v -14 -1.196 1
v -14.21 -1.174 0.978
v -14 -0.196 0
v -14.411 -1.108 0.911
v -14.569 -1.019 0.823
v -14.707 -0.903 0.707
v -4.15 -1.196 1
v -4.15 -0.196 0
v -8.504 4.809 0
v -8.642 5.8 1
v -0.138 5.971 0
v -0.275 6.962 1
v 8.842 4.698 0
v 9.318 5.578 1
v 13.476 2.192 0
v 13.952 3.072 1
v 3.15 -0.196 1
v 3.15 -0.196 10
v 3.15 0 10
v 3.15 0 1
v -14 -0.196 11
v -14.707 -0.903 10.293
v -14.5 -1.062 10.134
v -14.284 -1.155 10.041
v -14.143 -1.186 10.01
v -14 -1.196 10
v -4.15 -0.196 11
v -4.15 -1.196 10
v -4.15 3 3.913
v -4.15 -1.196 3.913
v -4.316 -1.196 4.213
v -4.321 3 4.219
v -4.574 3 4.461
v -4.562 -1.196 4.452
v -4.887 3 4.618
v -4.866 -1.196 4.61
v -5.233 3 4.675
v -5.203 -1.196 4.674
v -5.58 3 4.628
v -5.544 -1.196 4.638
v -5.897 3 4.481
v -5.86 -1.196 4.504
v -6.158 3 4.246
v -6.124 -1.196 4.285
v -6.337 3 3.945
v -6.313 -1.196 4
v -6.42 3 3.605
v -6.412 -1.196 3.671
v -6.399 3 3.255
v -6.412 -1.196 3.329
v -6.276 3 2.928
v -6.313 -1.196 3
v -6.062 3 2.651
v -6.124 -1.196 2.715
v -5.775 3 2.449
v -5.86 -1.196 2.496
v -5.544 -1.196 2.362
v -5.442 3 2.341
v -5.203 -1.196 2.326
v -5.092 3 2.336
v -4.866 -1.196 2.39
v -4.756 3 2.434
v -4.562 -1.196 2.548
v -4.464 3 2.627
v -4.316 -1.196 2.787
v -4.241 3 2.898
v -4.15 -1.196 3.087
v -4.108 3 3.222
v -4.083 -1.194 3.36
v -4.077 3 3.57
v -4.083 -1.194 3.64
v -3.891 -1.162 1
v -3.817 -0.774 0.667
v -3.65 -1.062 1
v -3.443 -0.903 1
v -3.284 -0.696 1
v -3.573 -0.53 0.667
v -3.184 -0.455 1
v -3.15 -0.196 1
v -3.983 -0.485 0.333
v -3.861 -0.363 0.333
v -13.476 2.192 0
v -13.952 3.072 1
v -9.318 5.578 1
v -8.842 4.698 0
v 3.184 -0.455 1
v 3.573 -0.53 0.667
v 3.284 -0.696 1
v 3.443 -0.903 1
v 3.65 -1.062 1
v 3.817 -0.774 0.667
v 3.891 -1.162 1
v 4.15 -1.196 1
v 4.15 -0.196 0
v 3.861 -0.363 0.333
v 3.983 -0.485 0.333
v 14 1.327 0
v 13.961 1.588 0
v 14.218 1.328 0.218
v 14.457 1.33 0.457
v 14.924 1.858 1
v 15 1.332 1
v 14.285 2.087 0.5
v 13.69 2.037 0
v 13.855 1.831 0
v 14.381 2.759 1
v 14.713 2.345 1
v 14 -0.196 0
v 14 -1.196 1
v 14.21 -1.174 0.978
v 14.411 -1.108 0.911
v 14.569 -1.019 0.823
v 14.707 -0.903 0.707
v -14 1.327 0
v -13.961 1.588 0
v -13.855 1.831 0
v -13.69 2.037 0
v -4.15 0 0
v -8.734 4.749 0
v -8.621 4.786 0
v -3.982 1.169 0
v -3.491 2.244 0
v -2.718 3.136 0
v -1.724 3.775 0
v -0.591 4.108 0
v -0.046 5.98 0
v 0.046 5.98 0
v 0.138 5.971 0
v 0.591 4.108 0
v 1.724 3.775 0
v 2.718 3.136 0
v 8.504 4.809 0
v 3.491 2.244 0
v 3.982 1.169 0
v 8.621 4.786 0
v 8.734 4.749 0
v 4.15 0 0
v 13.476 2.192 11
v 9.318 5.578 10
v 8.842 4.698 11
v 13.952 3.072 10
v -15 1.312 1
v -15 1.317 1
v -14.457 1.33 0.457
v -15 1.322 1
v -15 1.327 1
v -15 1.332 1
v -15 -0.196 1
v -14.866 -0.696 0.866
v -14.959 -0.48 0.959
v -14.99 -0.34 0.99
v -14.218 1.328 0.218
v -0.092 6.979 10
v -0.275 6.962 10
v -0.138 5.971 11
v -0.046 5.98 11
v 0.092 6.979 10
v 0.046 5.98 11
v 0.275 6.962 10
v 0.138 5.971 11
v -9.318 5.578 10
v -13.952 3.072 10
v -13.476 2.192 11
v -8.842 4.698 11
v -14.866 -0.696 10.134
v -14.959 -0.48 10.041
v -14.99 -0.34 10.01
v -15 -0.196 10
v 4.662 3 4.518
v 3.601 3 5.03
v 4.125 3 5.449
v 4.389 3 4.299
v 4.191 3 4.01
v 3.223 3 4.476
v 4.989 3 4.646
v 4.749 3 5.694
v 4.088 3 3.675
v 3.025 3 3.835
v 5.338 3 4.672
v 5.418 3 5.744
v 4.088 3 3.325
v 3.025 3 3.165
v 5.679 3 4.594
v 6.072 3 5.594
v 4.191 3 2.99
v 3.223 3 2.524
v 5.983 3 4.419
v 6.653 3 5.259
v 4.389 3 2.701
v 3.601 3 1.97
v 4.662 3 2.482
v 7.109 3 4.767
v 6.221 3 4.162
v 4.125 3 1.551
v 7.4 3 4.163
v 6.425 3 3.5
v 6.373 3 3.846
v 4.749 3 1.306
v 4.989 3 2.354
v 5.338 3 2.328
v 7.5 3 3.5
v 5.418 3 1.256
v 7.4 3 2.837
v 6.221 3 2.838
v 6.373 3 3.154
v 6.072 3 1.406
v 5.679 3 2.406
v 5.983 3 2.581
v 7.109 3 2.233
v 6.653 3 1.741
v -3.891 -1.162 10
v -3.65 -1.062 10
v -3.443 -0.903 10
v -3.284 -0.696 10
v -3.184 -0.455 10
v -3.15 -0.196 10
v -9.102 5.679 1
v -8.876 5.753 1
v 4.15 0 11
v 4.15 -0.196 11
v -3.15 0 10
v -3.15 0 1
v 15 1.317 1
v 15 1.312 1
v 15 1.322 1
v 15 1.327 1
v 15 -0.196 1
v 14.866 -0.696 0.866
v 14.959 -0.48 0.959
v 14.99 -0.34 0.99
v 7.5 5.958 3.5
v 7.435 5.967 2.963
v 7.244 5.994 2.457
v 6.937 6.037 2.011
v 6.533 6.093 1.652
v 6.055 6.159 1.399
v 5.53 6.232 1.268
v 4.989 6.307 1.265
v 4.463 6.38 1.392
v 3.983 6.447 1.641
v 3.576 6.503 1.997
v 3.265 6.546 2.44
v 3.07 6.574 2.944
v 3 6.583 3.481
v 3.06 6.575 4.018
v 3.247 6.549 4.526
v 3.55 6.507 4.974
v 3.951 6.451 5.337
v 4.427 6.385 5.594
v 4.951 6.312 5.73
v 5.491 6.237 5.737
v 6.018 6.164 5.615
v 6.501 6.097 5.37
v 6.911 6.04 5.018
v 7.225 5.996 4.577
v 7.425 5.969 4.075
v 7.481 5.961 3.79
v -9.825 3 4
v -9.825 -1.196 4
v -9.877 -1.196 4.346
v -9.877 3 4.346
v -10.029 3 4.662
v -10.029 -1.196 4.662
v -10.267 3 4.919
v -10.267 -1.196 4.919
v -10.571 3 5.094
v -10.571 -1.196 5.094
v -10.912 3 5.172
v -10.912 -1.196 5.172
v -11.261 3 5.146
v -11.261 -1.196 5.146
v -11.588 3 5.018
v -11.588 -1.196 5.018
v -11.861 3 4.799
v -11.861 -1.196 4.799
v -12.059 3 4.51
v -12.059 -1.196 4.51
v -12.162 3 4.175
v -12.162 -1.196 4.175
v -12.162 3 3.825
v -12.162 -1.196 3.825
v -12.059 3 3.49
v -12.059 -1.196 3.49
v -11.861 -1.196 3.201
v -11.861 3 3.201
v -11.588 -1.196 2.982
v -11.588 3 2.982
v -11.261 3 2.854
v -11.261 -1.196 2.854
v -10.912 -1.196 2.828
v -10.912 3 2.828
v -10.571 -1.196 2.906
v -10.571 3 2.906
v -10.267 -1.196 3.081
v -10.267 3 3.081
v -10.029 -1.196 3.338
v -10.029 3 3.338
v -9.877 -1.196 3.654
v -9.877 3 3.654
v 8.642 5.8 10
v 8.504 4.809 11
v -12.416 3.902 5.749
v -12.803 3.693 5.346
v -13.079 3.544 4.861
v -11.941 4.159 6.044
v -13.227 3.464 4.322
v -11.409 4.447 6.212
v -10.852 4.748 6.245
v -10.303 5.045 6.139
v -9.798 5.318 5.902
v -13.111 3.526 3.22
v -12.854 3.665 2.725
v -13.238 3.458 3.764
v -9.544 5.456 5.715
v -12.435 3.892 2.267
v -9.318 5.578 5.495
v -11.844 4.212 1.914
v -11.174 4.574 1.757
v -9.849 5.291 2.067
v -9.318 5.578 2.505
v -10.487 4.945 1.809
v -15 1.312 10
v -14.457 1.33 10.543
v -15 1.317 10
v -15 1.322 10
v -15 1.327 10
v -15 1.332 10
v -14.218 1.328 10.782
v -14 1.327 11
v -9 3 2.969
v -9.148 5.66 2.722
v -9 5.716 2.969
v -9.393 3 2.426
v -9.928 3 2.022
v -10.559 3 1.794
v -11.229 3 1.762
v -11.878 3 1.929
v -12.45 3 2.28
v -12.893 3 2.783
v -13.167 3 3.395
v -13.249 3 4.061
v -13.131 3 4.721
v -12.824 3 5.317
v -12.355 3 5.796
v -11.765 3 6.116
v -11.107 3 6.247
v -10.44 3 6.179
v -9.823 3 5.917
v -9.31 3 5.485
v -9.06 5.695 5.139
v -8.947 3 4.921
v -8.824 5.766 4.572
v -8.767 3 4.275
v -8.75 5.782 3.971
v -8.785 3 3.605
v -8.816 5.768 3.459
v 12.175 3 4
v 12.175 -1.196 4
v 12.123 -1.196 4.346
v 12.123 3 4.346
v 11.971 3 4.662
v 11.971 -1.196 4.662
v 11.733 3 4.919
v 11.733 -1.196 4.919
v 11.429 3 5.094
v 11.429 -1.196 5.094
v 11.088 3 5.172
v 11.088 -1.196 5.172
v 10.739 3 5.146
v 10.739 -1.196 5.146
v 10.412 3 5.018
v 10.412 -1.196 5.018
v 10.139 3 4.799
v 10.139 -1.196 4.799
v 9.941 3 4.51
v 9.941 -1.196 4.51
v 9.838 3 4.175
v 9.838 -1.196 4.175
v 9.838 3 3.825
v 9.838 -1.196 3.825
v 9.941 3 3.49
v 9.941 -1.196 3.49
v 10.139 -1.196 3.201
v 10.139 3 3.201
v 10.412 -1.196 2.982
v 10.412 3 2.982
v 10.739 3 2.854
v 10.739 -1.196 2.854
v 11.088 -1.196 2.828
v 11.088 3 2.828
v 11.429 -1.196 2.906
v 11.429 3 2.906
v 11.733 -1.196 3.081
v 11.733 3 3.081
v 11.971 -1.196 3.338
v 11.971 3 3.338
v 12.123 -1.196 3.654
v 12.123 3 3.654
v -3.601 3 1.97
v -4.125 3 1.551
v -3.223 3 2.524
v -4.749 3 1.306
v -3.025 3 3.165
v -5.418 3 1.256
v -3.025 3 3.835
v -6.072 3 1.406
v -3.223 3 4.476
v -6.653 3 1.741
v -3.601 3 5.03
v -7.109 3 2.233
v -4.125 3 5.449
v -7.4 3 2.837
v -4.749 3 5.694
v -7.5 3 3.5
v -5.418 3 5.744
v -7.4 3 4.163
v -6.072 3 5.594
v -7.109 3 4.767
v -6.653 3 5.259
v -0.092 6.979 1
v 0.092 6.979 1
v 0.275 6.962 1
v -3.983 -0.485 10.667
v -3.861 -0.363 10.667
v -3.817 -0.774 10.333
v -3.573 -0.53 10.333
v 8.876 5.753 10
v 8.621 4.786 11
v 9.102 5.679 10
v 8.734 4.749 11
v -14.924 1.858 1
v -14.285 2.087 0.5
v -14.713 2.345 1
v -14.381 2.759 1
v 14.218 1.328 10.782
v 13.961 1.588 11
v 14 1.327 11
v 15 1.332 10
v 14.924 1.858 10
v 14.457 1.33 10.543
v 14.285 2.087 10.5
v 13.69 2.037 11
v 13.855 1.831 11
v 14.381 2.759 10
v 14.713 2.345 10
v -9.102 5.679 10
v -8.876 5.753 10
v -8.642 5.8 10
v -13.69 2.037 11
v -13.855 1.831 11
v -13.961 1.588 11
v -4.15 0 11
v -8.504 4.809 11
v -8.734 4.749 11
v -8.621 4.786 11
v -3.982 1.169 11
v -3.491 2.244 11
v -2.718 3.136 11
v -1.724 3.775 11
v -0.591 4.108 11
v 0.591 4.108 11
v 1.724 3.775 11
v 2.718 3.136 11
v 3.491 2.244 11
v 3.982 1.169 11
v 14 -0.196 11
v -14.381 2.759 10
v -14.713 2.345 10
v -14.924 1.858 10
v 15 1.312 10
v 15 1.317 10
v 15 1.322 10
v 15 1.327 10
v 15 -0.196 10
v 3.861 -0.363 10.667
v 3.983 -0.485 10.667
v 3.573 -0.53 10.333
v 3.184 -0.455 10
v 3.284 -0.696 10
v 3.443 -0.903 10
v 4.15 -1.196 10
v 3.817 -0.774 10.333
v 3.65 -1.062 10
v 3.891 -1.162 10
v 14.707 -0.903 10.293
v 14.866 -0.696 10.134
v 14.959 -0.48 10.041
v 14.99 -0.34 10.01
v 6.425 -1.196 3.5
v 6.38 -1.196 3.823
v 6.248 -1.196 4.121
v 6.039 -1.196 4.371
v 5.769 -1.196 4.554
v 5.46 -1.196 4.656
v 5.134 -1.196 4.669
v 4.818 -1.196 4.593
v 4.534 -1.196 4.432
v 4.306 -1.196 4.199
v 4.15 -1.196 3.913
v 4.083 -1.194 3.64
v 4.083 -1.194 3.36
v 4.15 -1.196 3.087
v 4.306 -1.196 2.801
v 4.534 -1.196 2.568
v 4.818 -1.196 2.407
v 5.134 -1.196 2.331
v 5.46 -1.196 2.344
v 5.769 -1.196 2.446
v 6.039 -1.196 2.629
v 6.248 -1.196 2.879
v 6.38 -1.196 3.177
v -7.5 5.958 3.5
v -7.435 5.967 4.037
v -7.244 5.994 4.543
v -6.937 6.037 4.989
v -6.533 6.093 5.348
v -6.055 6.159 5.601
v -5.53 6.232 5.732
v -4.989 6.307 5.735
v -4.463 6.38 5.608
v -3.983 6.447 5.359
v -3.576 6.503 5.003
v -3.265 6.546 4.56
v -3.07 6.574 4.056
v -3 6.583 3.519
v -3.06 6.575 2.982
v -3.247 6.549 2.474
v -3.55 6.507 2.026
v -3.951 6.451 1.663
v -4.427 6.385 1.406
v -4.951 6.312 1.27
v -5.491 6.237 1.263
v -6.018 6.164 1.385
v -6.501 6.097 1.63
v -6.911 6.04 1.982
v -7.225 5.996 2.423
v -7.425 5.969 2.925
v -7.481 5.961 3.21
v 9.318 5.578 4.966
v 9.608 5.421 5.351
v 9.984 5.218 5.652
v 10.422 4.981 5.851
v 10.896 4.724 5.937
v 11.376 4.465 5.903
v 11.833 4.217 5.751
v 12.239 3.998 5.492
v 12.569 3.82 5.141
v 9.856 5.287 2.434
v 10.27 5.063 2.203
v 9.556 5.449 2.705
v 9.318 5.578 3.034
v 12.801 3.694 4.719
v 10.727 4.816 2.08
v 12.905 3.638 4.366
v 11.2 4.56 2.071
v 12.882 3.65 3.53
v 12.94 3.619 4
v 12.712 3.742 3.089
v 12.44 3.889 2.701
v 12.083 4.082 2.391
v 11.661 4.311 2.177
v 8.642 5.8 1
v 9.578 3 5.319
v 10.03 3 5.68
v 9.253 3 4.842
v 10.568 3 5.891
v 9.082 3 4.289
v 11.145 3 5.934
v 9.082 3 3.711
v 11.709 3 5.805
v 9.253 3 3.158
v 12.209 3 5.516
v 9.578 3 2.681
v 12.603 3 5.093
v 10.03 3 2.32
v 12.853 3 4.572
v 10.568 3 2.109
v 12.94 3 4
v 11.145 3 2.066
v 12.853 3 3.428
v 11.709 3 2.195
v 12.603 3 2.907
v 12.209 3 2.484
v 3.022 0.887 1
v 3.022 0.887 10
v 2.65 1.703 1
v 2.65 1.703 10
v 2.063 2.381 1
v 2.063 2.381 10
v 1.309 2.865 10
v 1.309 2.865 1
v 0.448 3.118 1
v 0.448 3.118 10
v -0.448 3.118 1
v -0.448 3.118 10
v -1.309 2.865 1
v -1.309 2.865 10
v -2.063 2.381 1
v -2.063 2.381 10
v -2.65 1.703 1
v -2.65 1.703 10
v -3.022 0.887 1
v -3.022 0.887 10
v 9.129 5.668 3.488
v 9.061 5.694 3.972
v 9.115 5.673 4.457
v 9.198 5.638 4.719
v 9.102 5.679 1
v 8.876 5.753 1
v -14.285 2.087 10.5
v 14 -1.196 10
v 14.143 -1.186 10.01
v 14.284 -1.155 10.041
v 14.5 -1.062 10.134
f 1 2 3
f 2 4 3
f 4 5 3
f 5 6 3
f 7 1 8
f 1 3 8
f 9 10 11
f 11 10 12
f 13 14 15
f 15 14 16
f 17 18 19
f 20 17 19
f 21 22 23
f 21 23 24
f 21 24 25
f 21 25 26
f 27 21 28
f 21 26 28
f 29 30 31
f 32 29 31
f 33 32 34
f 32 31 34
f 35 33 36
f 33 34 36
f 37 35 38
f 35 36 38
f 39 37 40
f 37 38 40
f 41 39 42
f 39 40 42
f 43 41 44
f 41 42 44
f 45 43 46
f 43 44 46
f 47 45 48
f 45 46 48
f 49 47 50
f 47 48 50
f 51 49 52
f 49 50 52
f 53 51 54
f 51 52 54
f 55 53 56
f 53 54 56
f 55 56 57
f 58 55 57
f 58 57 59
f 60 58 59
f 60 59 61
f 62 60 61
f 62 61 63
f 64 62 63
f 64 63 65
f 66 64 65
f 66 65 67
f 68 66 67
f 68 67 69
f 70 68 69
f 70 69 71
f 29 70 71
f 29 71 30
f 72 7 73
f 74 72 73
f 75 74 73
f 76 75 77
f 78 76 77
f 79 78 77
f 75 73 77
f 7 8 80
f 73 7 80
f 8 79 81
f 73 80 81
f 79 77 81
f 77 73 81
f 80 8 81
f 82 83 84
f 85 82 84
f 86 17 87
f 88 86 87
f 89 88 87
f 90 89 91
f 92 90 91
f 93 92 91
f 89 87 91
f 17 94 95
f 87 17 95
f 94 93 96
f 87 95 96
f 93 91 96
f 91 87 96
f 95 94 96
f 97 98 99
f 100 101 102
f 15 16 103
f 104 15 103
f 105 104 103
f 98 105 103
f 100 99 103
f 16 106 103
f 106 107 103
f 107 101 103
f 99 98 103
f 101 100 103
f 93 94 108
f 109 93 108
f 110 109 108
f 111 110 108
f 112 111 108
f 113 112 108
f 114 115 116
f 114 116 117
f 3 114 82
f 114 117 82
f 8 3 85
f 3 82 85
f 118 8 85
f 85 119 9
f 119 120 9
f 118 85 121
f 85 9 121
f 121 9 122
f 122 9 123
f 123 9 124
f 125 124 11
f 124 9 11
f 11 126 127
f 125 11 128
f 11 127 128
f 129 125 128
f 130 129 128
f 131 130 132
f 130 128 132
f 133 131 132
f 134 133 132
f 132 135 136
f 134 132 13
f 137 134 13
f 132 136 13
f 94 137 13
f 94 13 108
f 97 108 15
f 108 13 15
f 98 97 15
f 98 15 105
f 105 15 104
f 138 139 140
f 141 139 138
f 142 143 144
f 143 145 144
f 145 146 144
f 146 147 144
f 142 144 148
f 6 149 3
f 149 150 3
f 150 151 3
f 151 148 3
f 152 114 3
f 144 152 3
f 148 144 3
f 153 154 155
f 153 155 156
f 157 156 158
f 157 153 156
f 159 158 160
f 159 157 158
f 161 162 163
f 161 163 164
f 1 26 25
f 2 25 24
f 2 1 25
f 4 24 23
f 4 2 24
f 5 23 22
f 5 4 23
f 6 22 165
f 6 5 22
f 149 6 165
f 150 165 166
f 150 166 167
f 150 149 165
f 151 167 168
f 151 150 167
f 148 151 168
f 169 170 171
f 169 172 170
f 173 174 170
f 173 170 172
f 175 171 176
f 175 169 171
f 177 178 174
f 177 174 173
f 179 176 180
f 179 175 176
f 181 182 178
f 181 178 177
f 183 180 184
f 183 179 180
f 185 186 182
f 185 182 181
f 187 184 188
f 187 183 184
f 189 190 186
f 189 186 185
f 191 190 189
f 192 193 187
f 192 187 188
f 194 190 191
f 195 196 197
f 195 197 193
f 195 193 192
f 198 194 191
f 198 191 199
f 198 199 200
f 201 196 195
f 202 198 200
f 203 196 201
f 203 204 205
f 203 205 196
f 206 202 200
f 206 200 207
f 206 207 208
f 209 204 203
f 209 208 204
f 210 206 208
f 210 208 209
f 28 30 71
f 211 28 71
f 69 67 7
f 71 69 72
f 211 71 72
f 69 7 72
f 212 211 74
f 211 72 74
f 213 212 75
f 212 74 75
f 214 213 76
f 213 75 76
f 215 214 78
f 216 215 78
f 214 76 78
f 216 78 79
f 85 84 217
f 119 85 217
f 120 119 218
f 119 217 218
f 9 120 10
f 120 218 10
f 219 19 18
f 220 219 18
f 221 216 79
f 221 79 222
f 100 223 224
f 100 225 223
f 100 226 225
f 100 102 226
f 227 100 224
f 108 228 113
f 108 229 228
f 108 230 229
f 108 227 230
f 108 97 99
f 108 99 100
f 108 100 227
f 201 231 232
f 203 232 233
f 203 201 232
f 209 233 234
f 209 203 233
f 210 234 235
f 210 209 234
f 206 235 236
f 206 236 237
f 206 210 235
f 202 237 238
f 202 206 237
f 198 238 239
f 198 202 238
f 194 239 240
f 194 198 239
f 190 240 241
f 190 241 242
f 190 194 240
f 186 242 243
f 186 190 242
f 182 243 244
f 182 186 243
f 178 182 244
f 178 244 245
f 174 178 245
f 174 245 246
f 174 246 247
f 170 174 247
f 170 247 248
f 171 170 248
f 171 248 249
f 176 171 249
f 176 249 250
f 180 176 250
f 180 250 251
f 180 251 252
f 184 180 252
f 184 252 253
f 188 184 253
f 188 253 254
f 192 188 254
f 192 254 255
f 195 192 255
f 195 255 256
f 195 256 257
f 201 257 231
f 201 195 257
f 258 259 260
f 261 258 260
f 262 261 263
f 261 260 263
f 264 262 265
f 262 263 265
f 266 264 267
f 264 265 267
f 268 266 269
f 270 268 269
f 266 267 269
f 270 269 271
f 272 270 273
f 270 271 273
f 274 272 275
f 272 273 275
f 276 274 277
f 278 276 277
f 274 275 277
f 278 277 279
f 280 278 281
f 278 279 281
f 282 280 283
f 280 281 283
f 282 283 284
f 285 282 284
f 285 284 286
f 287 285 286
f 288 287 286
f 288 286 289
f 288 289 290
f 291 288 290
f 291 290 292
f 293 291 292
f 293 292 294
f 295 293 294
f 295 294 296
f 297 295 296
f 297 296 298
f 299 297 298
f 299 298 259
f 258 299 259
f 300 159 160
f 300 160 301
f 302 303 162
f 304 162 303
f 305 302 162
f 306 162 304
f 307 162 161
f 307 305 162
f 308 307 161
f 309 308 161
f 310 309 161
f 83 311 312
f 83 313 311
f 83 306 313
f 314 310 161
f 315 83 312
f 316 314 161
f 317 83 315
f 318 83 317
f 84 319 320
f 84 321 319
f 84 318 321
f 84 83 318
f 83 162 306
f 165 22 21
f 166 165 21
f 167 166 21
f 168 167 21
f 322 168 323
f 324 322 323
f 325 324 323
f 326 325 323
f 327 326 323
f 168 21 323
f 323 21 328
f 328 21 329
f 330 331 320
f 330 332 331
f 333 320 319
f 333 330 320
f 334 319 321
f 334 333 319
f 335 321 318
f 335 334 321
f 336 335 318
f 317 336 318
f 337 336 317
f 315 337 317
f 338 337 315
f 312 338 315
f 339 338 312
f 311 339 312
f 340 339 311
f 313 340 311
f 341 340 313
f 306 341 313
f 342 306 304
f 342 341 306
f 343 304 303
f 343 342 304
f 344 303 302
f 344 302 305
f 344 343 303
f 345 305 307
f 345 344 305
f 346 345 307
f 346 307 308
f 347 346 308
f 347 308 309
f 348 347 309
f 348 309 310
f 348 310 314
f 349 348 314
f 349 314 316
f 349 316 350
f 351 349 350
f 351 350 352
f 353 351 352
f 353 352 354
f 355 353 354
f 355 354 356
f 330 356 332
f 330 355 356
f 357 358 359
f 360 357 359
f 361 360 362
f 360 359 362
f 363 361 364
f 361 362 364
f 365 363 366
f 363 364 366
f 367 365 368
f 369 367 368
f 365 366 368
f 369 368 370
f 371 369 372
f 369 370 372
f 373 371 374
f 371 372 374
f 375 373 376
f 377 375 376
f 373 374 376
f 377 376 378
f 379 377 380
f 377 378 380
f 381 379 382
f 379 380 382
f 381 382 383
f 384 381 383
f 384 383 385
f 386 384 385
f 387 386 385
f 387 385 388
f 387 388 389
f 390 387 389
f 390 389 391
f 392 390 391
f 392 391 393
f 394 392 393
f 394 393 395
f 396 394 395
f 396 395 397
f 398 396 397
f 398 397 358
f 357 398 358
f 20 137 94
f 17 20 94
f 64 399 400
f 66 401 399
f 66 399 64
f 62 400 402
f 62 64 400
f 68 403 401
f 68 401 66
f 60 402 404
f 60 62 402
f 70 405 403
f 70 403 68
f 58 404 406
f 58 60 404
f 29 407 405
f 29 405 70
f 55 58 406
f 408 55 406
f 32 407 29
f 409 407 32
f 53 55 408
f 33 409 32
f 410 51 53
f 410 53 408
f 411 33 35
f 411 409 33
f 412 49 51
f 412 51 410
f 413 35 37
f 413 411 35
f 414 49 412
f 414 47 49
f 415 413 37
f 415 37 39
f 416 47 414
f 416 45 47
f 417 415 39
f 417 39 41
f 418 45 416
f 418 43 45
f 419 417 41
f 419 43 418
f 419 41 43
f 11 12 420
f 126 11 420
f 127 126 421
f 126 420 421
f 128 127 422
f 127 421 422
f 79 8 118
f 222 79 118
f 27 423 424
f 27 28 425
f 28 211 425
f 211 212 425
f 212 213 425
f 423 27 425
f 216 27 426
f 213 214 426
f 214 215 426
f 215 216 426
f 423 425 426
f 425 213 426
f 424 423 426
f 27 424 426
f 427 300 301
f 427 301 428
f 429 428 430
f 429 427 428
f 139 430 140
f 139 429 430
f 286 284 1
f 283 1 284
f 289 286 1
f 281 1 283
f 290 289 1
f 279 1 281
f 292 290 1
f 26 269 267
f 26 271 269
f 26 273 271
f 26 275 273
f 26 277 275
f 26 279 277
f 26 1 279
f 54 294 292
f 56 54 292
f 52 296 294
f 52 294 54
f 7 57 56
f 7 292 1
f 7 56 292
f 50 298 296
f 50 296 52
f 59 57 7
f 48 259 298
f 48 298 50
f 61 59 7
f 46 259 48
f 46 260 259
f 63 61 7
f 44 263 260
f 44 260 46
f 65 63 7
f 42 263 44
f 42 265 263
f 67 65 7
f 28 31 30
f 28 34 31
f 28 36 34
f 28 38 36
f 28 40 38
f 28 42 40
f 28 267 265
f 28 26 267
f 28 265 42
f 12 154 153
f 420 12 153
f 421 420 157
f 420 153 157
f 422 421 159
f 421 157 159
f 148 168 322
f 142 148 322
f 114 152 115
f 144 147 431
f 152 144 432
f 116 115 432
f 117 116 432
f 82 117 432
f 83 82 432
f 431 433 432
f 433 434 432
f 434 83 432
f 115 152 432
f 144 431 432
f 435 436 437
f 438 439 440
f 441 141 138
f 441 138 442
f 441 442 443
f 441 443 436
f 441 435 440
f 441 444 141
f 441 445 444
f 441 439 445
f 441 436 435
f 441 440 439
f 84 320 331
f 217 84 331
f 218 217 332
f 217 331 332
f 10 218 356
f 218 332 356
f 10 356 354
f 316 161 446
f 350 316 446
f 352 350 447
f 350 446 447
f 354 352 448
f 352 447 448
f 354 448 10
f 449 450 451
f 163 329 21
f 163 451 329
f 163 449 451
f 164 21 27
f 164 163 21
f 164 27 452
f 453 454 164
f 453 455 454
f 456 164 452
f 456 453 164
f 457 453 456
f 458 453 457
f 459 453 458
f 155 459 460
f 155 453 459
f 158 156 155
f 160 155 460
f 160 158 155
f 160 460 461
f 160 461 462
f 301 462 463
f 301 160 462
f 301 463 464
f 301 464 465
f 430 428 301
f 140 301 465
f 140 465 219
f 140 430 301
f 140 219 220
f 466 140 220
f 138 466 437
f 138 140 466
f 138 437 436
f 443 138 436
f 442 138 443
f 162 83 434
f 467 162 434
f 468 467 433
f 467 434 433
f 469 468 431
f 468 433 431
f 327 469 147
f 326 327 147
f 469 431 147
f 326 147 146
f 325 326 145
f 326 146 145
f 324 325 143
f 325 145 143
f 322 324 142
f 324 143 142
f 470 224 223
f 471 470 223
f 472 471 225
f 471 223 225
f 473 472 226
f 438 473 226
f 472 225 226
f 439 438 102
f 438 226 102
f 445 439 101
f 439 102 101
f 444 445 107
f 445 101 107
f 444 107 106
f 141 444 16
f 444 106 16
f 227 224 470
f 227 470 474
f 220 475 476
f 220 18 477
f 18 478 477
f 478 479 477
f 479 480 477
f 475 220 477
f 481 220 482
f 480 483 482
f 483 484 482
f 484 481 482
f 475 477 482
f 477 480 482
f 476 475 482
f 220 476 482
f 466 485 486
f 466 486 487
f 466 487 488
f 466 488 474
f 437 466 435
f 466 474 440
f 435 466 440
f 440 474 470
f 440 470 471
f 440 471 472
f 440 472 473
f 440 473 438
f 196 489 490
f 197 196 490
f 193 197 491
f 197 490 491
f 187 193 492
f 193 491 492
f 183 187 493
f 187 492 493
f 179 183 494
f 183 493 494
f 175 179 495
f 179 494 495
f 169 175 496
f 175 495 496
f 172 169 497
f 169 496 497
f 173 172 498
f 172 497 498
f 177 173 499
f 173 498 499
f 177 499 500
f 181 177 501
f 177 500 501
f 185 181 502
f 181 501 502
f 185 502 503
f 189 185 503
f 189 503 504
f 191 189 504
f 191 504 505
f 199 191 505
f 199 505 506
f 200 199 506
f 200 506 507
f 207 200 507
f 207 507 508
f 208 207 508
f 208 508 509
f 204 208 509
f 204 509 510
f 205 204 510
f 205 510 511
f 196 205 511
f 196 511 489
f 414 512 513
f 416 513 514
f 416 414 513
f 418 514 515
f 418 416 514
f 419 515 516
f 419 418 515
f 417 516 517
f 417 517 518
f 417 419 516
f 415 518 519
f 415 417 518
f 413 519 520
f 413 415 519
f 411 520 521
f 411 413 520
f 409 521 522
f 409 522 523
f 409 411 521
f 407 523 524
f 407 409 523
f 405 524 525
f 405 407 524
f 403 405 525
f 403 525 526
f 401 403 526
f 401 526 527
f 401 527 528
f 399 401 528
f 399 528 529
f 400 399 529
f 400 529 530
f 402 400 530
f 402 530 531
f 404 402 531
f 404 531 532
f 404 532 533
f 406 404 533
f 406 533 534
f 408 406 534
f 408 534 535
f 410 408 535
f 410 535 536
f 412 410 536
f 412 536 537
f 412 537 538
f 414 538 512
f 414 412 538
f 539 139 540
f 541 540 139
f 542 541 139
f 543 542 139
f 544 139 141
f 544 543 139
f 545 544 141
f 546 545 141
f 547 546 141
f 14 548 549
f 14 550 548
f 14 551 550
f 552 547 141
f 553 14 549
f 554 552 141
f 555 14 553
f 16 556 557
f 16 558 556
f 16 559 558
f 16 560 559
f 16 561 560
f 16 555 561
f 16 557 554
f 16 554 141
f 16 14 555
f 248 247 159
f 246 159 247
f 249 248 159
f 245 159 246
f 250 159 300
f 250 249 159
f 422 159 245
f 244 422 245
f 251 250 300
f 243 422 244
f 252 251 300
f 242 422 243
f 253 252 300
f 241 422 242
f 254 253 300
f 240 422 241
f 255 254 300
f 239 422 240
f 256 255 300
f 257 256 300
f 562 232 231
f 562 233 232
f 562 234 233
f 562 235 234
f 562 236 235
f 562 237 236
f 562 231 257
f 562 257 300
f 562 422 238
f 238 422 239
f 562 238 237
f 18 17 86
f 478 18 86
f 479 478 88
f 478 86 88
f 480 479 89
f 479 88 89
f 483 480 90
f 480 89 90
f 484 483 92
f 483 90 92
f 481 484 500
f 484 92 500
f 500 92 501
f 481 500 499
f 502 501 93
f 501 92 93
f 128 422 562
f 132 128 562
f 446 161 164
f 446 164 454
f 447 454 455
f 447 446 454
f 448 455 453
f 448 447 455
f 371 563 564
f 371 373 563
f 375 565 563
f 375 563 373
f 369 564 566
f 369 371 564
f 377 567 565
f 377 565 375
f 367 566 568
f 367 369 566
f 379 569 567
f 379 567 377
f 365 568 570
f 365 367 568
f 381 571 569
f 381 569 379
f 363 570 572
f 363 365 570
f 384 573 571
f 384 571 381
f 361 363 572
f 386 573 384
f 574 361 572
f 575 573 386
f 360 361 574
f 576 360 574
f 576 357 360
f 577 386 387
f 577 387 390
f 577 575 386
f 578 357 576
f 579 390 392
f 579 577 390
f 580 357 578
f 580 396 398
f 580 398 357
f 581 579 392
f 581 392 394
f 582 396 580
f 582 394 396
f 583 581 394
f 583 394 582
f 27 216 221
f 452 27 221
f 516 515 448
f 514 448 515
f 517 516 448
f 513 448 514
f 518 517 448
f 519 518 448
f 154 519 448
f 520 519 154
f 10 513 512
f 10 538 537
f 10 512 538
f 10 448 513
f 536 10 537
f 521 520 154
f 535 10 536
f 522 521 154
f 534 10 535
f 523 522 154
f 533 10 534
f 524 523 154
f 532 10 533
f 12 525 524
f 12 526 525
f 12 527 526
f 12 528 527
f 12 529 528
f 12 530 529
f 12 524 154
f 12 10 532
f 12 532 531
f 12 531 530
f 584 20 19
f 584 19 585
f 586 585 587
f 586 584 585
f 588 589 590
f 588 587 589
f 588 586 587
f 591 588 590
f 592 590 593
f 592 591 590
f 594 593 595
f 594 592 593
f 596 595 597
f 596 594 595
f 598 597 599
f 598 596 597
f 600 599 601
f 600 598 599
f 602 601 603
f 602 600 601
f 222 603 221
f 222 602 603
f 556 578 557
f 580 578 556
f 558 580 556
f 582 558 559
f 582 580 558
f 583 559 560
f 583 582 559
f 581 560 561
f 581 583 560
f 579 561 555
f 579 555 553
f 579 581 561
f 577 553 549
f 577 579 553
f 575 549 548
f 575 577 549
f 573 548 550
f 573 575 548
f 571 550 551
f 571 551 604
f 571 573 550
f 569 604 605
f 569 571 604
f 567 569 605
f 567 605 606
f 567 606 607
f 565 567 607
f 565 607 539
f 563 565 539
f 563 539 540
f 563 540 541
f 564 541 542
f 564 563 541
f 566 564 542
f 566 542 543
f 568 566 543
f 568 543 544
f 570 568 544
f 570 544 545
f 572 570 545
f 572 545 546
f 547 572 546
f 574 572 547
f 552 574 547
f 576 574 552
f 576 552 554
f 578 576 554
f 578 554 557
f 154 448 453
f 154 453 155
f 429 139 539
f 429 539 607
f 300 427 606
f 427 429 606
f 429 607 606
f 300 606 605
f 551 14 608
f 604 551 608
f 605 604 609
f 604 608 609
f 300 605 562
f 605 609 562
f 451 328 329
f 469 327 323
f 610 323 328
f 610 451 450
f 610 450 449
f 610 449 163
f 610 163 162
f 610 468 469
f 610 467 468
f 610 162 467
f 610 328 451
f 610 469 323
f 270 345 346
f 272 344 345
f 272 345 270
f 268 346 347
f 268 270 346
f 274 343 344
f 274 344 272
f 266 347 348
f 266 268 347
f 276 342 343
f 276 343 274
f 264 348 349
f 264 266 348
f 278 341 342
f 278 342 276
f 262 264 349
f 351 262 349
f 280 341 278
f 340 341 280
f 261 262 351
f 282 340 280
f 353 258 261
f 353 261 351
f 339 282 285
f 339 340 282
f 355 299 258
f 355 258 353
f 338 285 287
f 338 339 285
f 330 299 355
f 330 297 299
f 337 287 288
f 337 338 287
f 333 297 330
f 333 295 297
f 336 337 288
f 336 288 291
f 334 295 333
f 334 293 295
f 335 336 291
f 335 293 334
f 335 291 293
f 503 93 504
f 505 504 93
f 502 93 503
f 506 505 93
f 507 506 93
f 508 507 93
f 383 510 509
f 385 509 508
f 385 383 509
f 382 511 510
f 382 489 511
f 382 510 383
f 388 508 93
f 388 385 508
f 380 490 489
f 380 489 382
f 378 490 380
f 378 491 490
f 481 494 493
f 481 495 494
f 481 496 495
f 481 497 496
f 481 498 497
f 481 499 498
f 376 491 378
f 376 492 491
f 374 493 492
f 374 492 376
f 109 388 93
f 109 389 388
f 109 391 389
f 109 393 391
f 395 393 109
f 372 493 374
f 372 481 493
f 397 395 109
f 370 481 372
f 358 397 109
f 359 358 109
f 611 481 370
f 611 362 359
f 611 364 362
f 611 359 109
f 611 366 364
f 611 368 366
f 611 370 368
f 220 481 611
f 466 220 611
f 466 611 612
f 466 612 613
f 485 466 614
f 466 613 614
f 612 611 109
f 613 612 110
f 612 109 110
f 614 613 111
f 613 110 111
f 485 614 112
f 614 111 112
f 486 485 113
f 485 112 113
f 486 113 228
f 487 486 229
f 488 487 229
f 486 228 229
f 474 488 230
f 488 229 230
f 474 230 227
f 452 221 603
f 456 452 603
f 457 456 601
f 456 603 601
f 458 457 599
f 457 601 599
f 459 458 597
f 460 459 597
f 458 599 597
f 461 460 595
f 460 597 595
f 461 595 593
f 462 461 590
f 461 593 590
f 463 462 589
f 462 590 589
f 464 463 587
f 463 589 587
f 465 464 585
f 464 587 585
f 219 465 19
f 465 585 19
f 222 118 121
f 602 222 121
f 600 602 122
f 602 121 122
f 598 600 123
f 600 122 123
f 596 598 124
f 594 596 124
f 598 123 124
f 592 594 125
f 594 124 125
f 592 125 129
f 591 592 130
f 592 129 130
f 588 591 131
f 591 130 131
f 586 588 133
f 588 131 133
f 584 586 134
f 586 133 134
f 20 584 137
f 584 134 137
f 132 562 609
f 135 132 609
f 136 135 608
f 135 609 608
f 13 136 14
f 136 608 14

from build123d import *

# Parameters (mm, degrees)
BOSS_EXTRUDE1_DEPTH     = 11
CUT_EXTRUDE1_DEPTH      = 20.874606914
CUT_EXTRUDE1_DEPTH_BACK = 20.874606914
SKETCH3_W               = 11.85
SKETCH3_H               = 1.196323822
BOSS_EXTRUDE2_DEPTH     = 11
CHAMFER1_SIZE           = 1
FILLET1_R               = 1
SKETCH4_R               = 1.175
CUT_EXTRUDE2_DEPTH      = 21.326822777
CUT_EXTRUDE3_START      = 3
SKETCH5_R               = 2.25
SKETCH5_R_2             = 1.939534676
CUT_EXTRUDE3_DEPTH      = 10
FILLET2_R               = 2
FILLET3_R               = 1
CHAMFER2_SIZE           = 1


# Some blends are built 0.0001 mm under size
with BuildPart() as part:
    # Sketch1 → Boss-Extrude1 (new body)
    with BuildSketch(Plane.XY):
        with BuildLine():
            Line((-3.15, 0), (-15, 0))
            Line((-15, 0), (-15, 7))
            Line((-15, 7), (15, 7))
            Line((15, 7), (15, 0))
            Line((15, 0), (3.15, 0))
            ThreePointArc((3.15, 0), (0, 3.15), (-3.15, 0))
        make_face()
    extrude(amount=BOSS_EXTRUDE1_DEPTH)

    # Sketch2 → Cut-Extrude1 (cut, two sides: drawn at the far end of the back side and taken through both)
    with BuildSketch(Plane.XY.offset(11).offset(-CUT_EXTRUDE1_DEPTH_BACK)):
        Polygon((-9, 5.75), (0, 7), (-15, 7), (-15, 2.504439372), align=None)
        Polygon((15, 7), (0, 7), (9, 5.75), (15, 2.504439372), align=None)
    extrude(amount=CUT_EXTRUDE1_DEPTH + CUT_EXTRUDE1_DEPTH_BACK, mode=Mode.SUBTRACT)

    # Sketch3 → Boss-Extrude2 (add)
    with BuildSketch(Plane.XY.offset(11)):
        with Locations((-9.075, -0.598161911)):
            Rectangle(SKETCH3_W, SKETCH3_H)
        with Locations((9.075, -0.598161911)):
            Rectangle(SKETCH3_W, SKETCH3_H)
    extrude(amount=-BOSS_EXTRUDE2_DEPTH)

    # Chamfer1
    chamfer1_edges = [part.edges().sort_by_distance(p)[0] for p in [
        (15, 0.654057775, 11),
        (-15, 0.654057775, 0),
        (-15, 0.654057775, 11),
        (15, 0.654057775, 0),
    ]]
    chamfer(chamfer1_edges, length=CHAMFER1_SIZE)

    # Fillet1
    fillet1_edges = [part.edges().sort_by_distance(p)[0] for p in [
        (-3.15, -1.196323822, 5.5),
        (3.15, -1.196323822, 5.5),
    ]]
    fillet(fillet1_edges, radius=FILLET1_R)

    # Sketch4 → Cut-Extrude2 (cut, through all)
    with BuildSketch(Plane.XZ.offset(1.196323822)):
        with Locations(Location((-5.25, 3.5, 0), (0, 0, 20.581969212))):
            Circle(SKETCH4_R)
        with Locations((5.25, 3.5)):
            Circle(SKETCH4_R)
        with Locations((-11, 4)):
            Circle(SKETCH4_R)
        with Locations((11, 4)):
            Circle(SKETCH4_R)
    extrude(amount=-CUT_EXTRUDE2_DEPTH, mode=Mode.SUBTRACT)

    # Sketch5 → Cut-Extrude3 (cut)
    with BuildSketch(Plane(origin=(0, 0, 0), x_dir=(1, 0, 0), z_dir=(0, 1, 0)).offset(CUT_EXTRUDE3_START)):
        with Locations(Location((-5.25, -3.5, 0), (0, 0, 180))):
            Circle(SKETCH5_R)
        with Locations((5.25, -3.5)):
            Circle(SKETCH5_R)
        with Locations(Location((-11, -4, 0), (0, 0, 27.266044451))):
            Circle(SKETCH5_R)
        with Locations((11, -4)):
            Circle(SKETCH5_R_2)
    extrude(amount=CUT_EXTRUDE3_DEPTH, mode=Mode.SUBTRACT)

    # Fillet2
    # the kernel refuses this fillet: 2 mm, written as the material it takes off along each edge
    with BuildSketch(Plane(origin=(9, 5.75, -2.170275709), x_dir=(-0.9904922731777516, 0.13756837127468827, 0), z_dir=(0, 0, 1))) as fillet2_piece_1:
        with BuildLine():
            CenterArc((FILLET2_R * 0.180856309082, FILLET2_R), FILLET2_R, 249.497020474, 20.502979526)
            Line((-FILLET2_R * 0.169399781042, FILLET2_R * 0.0633460236933), (-FILLET2_R * 0.176404902844, FILLET2_R * 0.0446129441672))
            Line((-FILLET2_R * 0.176404902844, FILLET2_R * 0.0446129441672), (-FILLET2_R * 0.00361712618164, -FILLET2_R * 0.02))
            Line((-FILLET2_R * 0.00361712618164, -FILLET2_R * 0.02), (FILLET2_R * 0.180856309082, -FILLET2_R * 0.02))
            Line((FILLET2_R * 0.180856309082, -FILLET2_R * 0.02), (FILLET2_R * 0.180856309082, 0))
        make_face()
    extrude(amount=15.340551418, mode=Mode.SUBTRACT)
    with BuildSketch(Plane(origin=(-9, 5.75, 5.139499303), x_dir=(-0.879564366325619, -0.4757799128696085, 0), z_dir=(0, 0, -1))) as fillet2_piece_2:
        with BuildLine():
            CenterArc((FILLET2_R * 0.180856309082, -FILLET2_R), FILLET2_R, 90, 20.502979526)
            Line((-FILLET2_R * 0.169399781042, -FILLET2_R * 0.0633460236933), (-FILLET2_R * 0.176404902844, -FILLET2_R * 0.0446129441672))
            Line((-FILLET2_R * 0.176404902844, -FILLET2_R * 0.0446129441672), (-FILLET2_R * 0.00361712618164, FILLET2_R * 0.02))
            Line((-FILLET2_R * 0.00361712618164, FILLET2_R * 0.02), (FILLET2_R * 0.180856309082, FILLET2_R * 0.02))
            Line((FILLET2_R * 0.180856309082, FILLET2_R * 0.02), (FILLET2_R * 0.180856309082, 0))
        make_face()
    extrude(amount=7.309775012, mode=Mode.SUBTRACT)
    with BuildSketch(Plane(origin=(-9, 5.75, 13.170275709), x_dir=(-0.879564366325619, -0.4757799128696085, 0), z_dir=(0, 0, -1))) as fillet2_piece_3:
        with BuildLine():
            CenterArc((FILLET2_R * 0.180856309082, -FILLET2_R), FILLET2_R, 90, 20.502979526)
            Line((-FILLET2_R * 0.169399781042, -FILLET2_R * 0.0633460236933), (-FILLET2_R * 0.176404902844, -FILLET2_R * 0.0446129441672))
            Line((-FILLET2_R * 0.176404902844, -FILLET2_R * 0.0446129441672), (-FILLET2_R * 0.00361712618164, FILLET2_R * 0.02))
            Line((-FILLET2_R * 0.00361712618164, FILLET2_R * 0.02), (FILLET2_R * 0.180856309082, FILLET2_R * 0.02))
            Line((FILLET2_R * 0.180856309082, FILLET2_R * 0.02), (FILLET2_R * 0.180856309082, 0))
        make_face()
    extrude(amount=10.309775012, mode=Mode.SUBTRACT)
    with BuildSketch(Plane(origin=(0, 7, 12.666666667), x_dir=(-0.9904922731777517, -0.13756837127468774, 0), z_dir=(0, 0, -1))) as fillet2_piece_4:
        with BuildLine():
            CenterArc((FILLET2_R * 0.138888888889, -FILLET2_R), FILLET2_R, 90, 15.814325406)
            Line((-FILLET2_R * 0.133631928674, -FILLET2_R * 0.0378501135503), (-FILLET2_R * 0.139082345025, -FILLET2_R * 0.0186071158213))
            Line((-FILLET2_R * 0.139082345025, -FILLET2_R * 0.0186071158213), (-FILLET2_R * 0.00277777777778, FILLET2_R * 0.02))
            Line((-FILLET2_R * 0.00277777777778, FILLET2_R * 0.02), (FILLET2_R * 0.138888888889, FILLET2_R * 0.02))
            Line((FILLET2_R * 0.138888888889, FILLET2_R * 0.02), (FILLET2_R * 0.138888888889, 0))
        make_face()
    extrude(amount=14.333333333, mode=Mode.SUBTRACT)
    with BuildSketch(Plane(origin=(-15, 2.504439372, -6.151996245), x_dir=(0.8795643663256194, 0.4757799128696078, 0), z_dir=(0, 0, 1))) as fillet2_piece_5:
        with BuildLine():
            CenterArc((FILLET2_R * 0.595999687118, -FILLET2_R), FILLET2_R, 90, 61.589857771)
            Line((-FILLET2_R * 0.283564679207, -FILLET2_R * 0.52422008713), (-FILLET2_R * 0.301155966534, -FILLET2_R * 0.514704488873))
            Line((-FILLET2_R * 0.301155966534, -FILLET2_R * 0.514704488873), (-FILLET2_R * 0.0119199937424, FILLET2_R * 0.02))
            Line((-FILLET2_R * 0.0119199937424, FILLET2_R * 0.02), (FILLET2_R * 0.595999687118, FILLET2_R * 0.02))
            Line((FILLET2_R * 0.595999687118, FILLET2_R * 0.02), (FILLET2_R * 0.595999687118, 0))
        make_face()
    extrude(amount=23.303992491, mode=Mode.SUBTRACT)
    with BuildSketch(Plane(origin=(15, 2.504439372, -6.151996245), x_dir=(-0.87956436632562, 0.47577991286960686, 0), z_dir=(0, 0, 1))) as fillet2_piece_6:
        with BuildLine():
            CenterArc((FILLET2_R * 0.595999687118, FILLET2_R), FILLET2_R, 208.410142229, 61.589857771)
            Line((-FILLET2_R * 0.283564679207, FILLET2_R * 0.52422008713), (-FILLET2_R * 0.301155966534, FILLET2_R * 0.514704488873))
            Line((-FILLET2_R * 0.301155966534, FILLET2_R * 0.514704488873), (-FILLET2_R * 0.0119199937424, -FILLET2_R * 0.02))
            Line((-FILLET2_R * 0.0119199937424, -FILLET2_R * 0.02), (FILLET2_R * 0.595999687118, -FILLET2_R * 0.02))
            Line((FILLET2_R * 0.595999687118, -FILLET2_R * 0.02), (FILLET2_R * 0.595999687118, 0))
        make_face()
    extrude(amount=23.303992491, mode=Mode.SUBTRACT)

    # Fillet3
    fillet3_edges = [part.edges().sort_by_distance(p)[0] for p in [
        (15, -1.196323822, 5.5),
        (-15, -1.196323822, 5.5),
    ]]
    fillet(fillet3_edges, radius=FILLET3_R)

    # Chamfer2
    chamfer2_edges = [part.edges().sort_by_distance(p)[0] for p in [
        (-11.634854678, 4.324736566, 0),
        (-11.634854678, 4.324736566, 11),
        (-8.989888283, 5.719170071, 0),
        (-8.989888283, 5.719170071, 11),
        (-4.458431595, 6.38077339, 0),
        (-4.458431595, 6.38077339, 11),
        (11.634854678, 4.324736566, 11),
        (11.634854678, 4.324736566, 0),
        (0, 6.980802017, 0),
        (0, 6.980802017, 11),
        (8.989888283, 5.719170071, 0),
        (8.989888283, 5.719170071, 11),
        (4.458431595, 6.38077339, 11),
        (4.458431595, 6.38077339, 0),
        (-9.075, -1.196323822, 0),
        (9.075, -1.196323822, 0),
        (-3.442893219, -0.903430603, 0),
        (-3.442893219, -0.903430603, 11),
        (3.442893219, -0.903430603, 11),
        (3.442893219, -0.903430603, 0),
        (-3.15, -0.098161911, 0),
        (3.15, -0.098161911, 0),
        (0, 3.15, 0),
        (0, 3.15, 11),
        (-9.075, -1.196323822, 11),
        (9.075, -1.196323822, 11),
        (-3.15, -0.098161911, 11),
        (3.15, -0.098161911, 11),
        (-13.975873835, 3.058197787, 0),
        (-13.975873835, 3.058197787, 11),
        (13.975873835, 3.058197787, 0),
        (13.975873835, 3.058197787, 11),
    ]]
    chamfer(chamfer2_edges, length=CHAMFER2_SIZE - 0.0001)  # a hair under: the kernel refuses the full size


solid = part.part
